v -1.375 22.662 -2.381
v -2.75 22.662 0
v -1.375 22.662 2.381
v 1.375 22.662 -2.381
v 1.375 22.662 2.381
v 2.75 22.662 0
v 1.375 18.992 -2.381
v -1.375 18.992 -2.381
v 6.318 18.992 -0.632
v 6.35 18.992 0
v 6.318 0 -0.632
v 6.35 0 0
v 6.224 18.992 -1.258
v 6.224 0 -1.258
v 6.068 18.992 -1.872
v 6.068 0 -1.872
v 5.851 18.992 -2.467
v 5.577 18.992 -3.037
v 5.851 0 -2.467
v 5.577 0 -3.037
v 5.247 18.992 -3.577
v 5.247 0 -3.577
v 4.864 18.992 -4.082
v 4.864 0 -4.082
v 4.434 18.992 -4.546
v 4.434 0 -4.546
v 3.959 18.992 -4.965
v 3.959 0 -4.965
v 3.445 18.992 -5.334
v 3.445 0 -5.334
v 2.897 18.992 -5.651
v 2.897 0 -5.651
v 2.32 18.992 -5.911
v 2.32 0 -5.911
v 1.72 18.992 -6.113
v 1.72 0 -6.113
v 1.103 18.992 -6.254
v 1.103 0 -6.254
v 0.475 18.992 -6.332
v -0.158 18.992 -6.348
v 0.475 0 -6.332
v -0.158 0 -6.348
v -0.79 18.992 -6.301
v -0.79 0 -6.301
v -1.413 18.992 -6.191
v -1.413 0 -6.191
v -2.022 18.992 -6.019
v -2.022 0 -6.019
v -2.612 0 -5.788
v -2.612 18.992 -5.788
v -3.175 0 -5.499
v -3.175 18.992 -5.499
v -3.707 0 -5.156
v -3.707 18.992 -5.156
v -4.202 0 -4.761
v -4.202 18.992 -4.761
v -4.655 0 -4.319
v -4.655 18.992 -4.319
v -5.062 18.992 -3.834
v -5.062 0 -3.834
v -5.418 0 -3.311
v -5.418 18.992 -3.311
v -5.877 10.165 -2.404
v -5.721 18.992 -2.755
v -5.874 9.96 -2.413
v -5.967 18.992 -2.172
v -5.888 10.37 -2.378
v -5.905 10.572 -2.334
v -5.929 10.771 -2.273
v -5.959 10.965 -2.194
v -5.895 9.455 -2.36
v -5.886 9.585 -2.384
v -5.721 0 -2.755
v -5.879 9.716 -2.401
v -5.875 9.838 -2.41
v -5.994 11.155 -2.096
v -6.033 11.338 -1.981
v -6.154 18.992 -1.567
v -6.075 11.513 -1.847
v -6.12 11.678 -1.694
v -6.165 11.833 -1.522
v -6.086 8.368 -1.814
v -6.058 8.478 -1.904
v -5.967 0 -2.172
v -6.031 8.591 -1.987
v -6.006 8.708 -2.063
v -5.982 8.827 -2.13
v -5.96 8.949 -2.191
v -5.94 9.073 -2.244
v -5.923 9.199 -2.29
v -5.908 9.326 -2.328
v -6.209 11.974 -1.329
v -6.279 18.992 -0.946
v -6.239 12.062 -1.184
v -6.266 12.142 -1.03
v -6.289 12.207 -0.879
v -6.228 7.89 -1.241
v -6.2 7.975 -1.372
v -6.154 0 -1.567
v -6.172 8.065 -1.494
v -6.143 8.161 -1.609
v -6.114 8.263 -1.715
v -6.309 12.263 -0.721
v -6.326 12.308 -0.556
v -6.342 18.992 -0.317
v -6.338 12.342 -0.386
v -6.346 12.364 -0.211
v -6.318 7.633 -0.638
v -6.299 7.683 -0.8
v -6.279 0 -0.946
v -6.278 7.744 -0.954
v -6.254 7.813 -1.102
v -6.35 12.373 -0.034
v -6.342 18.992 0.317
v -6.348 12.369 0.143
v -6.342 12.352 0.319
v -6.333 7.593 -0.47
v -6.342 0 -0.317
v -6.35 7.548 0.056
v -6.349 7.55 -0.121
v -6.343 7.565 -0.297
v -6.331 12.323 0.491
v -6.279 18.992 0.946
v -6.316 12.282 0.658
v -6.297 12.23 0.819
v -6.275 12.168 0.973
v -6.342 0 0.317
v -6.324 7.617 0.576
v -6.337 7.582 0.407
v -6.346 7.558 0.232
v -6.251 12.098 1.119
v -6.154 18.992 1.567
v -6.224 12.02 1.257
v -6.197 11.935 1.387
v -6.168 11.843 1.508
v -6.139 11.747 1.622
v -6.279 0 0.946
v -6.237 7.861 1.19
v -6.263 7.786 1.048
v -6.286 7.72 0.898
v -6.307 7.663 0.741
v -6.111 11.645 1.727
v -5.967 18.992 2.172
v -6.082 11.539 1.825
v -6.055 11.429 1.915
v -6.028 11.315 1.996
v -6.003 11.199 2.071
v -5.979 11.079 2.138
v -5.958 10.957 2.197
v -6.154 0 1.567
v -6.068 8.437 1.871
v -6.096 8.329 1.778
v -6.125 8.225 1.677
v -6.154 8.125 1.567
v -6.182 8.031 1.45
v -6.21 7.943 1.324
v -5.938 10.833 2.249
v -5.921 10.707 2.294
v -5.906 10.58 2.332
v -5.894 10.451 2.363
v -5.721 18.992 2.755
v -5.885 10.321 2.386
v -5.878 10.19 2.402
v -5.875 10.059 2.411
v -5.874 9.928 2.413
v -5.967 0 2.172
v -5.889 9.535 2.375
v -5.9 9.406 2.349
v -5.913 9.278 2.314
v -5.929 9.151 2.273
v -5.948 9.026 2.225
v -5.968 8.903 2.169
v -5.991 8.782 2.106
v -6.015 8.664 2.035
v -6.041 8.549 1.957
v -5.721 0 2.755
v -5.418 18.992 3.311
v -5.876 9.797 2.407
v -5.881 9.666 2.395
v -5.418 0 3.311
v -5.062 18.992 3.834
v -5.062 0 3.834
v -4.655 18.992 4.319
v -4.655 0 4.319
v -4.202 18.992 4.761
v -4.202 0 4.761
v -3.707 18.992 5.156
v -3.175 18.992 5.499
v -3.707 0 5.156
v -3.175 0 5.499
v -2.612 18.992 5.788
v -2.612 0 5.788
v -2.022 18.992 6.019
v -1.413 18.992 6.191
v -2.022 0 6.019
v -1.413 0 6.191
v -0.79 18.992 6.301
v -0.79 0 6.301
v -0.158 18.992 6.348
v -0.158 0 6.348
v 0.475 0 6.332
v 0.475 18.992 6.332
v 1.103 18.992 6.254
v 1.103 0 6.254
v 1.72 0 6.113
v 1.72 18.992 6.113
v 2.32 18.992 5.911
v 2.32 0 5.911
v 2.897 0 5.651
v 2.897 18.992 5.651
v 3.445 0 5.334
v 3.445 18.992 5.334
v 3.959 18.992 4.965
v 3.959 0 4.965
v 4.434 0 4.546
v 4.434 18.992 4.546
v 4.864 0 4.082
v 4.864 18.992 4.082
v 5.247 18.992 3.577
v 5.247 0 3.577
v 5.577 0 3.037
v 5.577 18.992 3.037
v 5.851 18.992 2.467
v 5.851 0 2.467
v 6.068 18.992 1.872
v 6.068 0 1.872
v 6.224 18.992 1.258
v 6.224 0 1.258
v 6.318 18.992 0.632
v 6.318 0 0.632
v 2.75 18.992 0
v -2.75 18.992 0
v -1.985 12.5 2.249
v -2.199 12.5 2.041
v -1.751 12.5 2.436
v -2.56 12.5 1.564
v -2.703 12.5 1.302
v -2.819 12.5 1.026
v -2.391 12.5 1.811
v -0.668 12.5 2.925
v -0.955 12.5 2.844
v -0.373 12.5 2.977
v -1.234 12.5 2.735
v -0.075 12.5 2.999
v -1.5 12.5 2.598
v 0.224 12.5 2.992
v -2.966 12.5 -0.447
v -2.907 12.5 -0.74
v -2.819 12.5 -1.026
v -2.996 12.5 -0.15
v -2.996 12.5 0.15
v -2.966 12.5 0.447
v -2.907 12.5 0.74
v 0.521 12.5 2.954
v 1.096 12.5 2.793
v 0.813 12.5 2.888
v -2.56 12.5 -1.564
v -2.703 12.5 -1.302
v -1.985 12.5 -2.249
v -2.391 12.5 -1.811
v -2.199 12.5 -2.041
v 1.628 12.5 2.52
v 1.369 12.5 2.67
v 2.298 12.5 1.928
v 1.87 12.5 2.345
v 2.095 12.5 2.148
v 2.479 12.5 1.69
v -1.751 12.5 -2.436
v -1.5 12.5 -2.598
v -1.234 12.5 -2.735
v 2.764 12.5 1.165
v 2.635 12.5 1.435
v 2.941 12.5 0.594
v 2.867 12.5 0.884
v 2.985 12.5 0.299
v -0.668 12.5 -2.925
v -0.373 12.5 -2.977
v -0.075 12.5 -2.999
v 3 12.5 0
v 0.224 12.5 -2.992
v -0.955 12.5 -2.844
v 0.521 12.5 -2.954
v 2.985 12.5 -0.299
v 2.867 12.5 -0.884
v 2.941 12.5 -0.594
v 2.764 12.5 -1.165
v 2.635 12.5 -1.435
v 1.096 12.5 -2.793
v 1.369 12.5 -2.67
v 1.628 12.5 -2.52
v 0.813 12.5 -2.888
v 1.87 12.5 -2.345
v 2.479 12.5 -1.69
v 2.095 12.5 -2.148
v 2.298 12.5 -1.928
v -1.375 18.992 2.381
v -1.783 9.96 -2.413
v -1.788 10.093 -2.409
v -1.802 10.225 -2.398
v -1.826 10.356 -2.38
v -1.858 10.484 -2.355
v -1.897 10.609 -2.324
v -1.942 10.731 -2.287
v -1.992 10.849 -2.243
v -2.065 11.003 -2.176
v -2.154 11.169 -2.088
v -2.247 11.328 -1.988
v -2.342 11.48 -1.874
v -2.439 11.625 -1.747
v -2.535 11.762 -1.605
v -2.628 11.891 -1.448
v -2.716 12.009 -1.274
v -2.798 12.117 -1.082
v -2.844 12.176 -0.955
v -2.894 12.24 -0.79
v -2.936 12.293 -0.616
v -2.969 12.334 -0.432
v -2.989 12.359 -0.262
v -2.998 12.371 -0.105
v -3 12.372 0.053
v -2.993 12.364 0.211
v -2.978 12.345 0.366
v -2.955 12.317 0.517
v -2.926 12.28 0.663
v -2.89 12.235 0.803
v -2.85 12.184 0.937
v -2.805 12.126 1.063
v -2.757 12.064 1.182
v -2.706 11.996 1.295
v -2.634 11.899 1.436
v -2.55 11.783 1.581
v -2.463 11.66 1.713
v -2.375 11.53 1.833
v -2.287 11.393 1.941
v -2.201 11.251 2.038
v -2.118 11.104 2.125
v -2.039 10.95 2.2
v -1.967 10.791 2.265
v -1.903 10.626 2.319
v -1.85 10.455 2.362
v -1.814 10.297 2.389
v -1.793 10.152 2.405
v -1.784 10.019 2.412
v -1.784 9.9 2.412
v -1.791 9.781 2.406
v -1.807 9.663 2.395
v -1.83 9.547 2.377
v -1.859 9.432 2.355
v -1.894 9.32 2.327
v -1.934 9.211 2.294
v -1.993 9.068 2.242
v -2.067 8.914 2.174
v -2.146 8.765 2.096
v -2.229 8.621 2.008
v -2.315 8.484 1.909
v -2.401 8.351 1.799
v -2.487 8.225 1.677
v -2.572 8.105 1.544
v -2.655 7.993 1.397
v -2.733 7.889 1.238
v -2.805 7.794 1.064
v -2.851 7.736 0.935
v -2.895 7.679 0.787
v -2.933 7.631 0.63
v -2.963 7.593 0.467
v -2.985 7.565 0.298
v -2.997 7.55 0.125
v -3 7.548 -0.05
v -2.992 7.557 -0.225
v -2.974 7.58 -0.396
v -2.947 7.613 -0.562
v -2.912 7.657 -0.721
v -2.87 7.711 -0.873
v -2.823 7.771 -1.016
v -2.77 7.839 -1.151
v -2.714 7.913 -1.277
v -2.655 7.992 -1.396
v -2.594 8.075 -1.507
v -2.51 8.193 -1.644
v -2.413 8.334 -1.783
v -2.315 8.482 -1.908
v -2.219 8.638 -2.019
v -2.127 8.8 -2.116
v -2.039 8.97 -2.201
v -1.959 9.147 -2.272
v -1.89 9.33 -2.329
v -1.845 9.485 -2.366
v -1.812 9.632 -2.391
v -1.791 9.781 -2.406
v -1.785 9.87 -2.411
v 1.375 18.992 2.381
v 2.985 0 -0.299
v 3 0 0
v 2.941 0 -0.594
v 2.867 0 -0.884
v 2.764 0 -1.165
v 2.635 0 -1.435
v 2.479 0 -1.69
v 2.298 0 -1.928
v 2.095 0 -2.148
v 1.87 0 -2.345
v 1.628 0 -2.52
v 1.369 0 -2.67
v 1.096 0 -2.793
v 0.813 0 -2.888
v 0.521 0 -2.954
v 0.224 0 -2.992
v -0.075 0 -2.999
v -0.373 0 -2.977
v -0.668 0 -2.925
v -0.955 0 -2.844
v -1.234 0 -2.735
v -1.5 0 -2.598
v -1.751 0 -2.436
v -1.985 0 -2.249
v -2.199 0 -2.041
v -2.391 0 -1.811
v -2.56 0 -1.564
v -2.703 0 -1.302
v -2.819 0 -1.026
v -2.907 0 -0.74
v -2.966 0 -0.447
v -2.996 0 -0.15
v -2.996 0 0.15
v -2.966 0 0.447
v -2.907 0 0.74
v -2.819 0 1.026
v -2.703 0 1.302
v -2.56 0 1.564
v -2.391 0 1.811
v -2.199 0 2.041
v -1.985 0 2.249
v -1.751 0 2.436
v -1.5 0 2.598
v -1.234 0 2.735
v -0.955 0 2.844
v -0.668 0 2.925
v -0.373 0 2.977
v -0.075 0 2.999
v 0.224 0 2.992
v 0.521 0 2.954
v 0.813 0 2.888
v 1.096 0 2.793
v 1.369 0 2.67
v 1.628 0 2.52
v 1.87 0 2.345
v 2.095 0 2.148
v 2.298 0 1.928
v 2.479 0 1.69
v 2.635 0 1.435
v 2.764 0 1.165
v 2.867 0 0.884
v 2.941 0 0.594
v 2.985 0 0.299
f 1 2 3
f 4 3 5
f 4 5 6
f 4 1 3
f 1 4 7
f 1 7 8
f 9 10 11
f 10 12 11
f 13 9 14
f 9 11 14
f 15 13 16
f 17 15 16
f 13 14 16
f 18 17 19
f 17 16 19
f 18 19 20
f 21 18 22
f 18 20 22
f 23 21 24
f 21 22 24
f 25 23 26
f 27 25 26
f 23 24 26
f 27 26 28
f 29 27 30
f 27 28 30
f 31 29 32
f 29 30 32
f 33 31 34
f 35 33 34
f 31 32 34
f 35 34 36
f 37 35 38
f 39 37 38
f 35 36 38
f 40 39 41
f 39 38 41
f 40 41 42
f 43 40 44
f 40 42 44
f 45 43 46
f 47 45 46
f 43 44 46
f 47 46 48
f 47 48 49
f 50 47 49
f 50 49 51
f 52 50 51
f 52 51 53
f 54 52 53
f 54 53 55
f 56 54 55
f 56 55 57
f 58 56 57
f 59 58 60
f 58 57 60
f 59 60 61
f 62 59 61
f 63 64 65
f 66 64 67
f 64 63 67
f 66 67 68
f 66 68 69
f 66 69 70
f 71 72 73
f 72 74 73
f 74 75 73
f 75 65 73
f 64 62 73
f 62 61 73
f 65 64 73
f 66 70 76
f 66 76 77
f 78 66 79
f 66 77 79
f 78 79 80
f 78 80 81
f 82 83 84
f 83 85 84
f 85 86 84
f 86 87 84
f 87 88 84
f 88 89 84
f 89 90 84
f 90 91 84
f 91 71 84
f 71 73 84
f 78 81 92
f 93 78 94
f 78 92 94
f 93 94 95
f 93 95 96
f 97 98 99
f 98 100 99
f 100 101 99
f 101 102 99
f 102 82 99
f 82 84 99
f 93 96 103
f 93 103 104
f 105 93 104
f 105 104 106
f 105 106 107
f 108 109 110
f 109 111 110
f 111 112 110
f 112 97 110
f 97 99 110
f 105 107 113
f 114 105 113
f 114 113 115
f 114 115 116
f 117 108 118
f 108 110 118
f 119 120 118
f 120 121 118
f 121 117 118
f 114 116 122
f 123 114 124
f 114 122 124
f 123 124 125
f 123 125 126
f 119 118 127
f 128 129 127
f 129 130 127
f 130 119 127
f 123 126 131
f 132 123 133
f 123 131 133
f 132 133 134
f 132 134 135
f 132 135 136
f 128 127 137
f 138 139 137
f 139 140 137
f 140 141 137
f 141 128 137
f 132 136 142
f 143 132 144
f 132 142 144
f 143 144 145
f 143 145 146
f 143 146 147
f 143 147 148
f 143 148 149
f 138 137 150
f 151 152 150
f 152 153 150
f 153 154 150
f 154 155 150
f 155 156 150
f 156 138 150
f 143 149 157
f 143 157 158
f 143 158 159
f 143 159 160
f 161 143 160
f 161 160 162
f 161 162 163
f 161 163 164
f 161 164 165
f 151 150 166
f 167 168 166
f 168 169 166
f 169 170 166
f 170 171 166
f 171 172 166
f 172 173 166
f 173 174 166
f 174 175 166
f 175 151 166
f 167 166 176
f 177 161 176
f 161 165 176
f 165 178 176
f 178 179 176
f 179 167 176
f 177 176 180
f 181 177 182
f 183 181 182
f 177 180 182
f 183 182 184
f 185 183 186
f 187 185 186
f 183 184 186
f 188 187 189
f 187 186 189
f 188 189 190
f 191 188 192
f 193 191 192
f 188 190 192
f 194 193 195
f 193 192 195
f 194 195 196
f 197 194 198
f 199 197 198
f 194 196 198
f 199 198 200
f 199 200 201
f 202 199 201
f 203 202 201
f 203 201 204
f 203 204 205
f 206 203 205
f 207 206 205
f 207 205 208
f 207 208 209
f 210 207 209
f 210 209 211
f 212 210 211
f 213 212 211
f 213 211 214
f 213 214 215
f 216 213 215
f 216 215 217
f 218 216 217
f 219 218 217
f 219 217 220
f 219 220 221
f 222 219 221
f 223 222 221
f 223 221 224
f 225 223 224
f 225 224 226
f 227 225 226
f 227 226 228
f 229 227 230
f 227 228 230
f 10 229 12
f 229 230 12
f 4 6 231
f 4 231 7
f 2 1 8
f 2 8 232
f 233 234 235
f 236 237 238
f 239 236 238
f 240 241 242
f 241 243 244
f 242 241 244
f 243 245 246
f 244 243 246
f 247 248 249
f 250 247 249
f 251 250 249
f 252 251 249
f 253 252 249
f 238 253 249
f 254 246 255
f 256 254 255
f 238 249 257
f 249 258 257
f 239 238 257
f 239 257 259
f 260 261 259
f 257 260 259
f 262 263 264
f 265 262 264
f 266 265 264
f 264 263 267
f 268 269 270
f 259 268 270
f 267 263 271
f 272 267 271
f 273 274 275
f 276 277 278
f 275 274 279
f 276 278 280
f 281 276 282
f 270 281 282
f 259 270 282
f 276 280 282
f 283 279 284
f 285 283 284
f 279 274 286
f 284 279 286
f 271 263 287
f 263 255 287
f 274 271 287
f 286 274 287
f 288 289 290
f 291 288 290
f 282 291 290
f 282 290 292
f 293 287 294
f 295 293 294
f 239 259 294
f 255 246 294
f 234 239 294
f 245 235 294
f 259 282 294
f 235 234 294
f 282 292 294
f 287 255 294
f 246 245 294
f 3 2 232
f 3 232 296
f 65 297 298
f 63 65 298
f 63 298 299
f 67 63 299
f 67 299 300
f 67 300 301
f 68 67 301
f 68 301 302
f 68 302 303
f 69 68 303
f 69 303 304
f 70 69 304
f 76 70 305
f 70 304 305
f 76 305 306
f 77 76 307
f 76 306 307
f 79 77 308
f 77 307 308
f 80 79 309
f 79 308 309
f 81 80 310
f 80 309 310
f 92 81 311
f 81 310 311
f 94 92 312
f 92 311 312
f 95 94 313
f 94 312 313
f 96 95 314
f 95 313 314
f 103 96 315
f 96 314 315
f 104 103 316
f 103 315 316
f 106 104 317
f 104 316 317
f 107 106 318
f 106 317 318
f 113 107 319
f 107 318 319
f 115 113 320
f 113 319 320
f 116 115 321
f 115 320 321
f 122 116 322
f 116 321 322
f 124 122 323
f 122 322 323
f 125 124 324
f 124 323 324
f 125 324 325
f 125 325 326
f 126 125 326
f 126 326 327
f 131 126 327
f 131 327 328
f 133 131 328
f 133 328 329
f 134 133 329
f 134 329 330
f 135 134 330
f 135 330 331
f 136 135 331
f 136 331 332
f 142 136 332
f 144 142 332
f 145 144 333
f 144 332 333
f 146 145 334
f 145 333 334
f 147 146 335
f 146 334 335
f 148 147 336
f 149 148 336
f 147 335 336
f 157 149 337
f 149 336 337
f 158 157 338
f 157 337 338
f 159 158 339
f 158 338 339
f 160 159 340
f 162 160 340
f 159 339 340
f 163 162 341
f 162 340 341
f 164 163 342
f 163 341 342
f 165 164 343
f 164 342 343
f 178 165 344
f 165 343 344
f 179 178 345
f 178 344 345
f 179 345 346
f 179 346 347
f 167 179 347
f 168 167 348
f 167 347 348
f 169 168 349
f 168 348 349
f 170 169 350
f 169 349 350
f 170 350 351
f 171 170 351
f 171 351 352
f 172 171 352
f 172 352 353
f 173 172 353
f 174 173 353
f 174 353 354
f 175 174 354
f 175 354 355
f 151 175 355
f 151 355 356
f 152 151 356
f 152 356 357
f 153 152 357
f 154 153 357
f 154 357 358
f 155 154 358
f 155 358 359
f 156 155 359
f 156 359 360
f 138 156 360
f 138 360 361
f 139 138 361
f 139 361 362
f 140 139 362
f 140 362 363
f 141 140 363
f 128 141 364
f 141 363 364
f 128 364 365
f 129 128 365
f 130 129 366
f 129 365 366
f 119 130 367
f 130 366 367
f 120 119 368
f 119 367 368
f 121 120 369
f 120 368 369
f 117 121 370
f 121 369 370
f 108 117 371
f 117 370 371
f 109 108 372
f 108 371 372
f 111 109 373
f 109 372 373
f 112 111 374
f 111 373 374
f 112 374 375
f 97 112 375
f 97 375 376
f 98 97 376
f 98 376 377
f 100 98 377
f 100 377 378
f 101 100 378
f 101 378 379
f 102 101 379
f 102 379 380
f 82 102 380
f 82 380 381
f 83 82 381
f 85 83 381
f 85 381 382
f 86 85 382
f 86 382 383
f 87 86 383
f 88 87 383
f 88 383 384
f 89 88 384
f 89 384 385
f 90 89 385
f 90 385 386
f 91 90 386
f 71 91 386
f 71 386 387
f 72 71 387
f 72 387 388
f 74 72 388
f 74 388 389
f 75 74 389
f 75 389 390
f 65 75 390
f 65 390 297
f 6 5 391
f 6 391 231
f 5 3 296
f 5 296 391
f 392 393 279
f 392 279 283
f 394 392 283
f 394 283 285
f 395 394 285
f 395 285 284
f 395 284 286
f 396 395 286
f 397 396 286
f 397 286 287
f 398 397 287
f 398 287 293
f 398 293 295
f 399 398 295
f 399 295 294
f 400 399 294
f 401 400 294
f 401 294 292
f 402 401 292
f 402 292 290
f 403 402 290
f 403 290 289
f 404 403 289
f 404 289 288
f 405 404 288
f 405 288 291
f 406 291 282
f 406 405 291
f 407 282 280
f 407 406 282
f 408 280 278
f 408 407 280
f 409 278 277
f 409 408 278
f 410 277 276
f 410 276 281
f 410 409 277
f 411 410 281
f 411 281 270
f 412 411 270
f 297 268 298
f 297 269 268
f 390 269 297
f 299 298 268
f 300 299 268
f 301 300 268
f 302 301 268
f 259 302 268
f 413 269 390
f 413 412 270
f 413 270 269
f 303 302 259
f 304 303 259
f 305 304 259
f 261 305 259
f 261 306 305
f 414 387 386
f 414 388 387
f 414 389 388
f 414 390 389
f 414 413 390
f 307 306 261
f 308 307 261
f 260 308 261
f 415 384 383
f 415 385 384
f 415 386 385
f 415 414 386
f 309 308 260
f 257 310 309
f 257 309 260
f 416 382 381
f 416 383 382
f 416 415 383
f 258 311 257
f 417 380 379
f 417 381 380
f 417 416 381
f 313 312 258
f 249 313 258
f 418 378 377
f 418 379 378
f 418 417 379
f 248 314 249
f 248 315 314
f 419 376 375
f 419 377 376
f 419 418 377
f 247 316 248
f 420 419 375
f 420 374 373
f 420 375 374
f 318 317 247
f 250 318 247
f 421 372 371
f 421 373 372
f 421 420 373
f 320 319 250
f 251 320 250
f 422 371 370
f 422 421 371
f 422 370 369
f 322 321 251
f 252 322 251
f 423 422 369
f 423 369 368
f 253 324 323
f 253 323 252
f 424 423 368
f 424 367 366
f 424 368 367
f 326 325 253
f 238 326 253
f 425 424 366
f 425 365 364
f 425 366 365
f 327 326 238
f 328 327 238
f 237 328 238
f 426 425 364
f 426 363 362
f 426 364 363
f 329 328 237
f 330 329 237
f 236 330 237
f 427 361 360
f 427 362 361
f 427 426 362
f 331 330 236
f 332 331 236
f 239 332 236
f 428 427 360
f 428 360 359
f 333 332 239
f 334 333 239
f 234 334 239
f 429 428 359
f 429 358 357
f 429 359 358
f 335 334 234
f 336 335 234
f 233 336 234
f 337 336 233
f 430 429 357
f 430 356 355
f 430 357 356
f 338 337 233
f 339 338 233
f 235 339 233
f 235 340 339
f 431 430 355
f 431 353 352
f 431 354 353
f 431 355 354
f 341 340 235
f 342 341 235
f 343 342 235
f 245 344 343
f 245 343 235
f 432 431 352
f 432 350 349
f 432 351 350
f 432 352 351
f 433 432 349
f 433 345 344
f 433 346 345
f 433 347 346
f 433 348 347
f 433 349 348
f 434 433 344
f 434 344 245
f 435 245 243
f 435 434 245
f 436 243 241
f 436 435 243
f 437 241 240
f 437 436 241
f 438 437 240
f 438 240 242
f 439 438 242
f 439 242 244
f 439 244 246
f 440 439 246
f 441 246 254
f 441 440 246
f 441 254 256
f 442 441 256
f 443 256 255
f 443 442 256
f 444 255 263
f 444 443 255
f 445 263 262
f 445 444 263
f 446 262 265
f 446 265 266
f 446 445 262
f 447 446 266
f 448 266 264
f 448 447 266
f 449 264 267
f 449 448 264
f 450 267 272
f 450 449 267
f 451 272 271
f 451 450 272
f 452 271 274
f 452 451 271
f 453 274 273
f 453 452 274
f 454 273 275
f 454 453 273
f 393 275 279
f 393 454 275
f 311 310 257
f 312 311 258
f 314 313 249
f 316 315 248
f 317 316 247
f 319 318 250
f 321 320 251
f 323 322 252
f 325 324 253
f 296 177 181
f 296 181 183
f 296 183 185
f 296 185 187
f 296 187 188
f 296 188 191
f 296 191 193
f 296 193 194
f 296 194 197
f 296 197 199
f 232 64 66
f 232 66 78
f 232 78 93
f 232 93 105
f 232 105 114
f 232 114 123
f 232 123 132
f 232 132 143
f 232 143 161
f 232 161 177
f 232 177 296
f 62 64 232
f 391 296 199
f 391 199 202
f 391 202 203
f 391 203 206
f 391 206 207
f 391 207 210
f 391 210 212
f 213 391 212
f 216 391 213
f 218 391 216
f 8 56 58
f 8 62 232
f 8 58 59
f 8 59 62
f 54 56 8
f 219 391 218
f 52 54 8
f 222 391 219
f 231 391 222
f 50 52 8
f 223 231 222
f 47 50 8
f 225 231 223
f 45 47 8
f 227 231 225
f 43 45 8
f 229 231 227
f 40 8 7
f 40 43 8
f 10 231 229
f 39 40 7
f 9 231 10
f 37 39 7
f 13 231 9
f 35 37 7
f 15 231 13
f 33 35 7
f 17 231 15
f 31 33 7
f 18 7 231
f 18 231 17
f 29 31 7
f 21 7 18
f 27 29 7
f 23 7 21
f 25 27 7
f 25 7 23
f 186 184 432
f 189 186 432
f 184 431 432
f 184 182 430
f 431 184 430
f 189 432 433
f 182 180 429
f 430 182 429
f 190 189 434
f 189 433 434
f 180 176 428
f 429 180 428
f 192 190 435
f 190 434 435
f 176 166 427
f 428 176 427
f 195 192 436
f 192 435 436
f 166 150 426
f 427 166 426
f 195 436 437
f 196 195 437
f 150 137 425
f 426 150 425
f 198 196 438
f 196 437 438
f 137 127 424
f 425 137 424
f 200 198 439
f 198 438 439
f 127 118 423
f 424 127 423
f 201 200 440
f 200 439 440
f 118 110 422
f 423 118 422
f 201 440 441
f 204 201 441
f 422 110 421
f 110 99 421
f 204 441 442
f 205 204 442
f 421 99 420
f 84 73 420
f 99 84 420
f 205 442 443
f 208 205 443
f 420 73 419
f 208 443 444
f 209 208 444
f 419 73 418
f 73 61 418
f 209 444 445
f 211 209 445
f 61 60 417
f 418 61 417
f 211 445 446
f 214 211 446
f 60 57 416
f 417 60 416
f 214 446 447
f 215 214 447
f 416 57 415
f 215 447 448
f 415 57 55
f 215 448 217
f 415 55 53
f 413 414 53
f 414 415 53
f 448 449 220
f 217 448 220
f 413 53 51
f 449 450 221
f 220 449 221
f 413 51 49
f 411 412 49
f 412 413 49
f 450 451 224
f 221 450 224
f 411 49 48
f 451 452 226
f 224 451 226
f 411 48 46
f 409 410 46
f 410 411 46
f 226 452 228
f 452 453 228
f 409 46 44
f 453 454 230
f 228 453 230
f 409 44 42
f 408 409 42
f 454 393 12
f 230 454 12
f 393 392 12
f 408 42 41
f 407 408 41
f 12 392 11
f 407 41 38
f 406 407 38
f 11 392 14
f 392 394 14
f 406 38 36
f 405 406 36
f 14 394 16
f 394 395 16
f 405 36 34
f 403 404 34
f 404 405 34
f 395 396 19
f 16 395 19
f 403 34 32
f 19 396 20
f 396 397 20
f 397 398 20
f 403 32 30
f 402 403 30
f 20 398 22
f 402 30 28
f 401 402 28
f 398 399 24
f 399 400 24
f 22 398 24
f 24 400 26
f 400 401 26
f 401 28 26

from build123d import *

# Parameters (mm, degrees)
SKETCH1_R           = 6.35
SKETCH1_R_2         = 3
BOSS_EXTRUDE1_DEPTH = 12.5
SKETCH4_R           = 2.413
CUT_EXTRUDE1_DEPTH  = 7.35
SKETCH6_R           = 6.35
BOSS_EXTRUDE4_DEPTH = 6.4925
BOSS_EXTRUDE5_DEPTH = 3.67


with BuildPart() as part:
    # Sketch1 → Boss-Extrude1 (new body)
    with BuildSketch(Plane(origin=(0, 0, 0), x_dir=(1, 0, 0), z_dir=(0, 1, 0))):
        Circle(SKETCH1_R)
        Circle(SKETCH1_R_2, mode=Mode.SUBTRACT)
    extrude(amount=BOSS_EXTRUDE1_DEPTH)

    # Sketch4 → Cut-Extrude1 (cut, through all)
    with BuildSketch(Plane(origin=(0, 0, 0), x_dir=(0, 0, -1), z_dir=(1, 0, 0))):
        with Locations((0, 9.96)):
            Circle(SKETCH4_R)
    extrude(amount=-CUT_EXTRUDE1_DEPTH, mode=Mode.SUBTRACT)

    # Sketch6 → Boss-Extrude4 (add)
    with BuildSketch(Plane(origin=(0, 12.5, 0), x_dir=(1, 0, 0), z_dir=(0, 1, 0))):
        Circle(SKETCH6_R)
    extrude(amount=BOSS_EXTRUDE4_DEPTH)

    # Sketch7 → Boss-Extrude5 (add)
    with BuildSketch(Plane(origin=(0, 18.9925, 0), x_dir=(1, 0, 0), z_dir=(0, 1, 0))):
        Polygon((-1.3748, 2.38122345), (-2.7496, 0), (-1.3748, -2.38122345), (1.3748, -2.38122345), (2.7496, 0), (1.3748, 2.38122345), align=None)
    extrude(amount=BOSS_EXTRUDE5_DEPTH)


solid = part.part
